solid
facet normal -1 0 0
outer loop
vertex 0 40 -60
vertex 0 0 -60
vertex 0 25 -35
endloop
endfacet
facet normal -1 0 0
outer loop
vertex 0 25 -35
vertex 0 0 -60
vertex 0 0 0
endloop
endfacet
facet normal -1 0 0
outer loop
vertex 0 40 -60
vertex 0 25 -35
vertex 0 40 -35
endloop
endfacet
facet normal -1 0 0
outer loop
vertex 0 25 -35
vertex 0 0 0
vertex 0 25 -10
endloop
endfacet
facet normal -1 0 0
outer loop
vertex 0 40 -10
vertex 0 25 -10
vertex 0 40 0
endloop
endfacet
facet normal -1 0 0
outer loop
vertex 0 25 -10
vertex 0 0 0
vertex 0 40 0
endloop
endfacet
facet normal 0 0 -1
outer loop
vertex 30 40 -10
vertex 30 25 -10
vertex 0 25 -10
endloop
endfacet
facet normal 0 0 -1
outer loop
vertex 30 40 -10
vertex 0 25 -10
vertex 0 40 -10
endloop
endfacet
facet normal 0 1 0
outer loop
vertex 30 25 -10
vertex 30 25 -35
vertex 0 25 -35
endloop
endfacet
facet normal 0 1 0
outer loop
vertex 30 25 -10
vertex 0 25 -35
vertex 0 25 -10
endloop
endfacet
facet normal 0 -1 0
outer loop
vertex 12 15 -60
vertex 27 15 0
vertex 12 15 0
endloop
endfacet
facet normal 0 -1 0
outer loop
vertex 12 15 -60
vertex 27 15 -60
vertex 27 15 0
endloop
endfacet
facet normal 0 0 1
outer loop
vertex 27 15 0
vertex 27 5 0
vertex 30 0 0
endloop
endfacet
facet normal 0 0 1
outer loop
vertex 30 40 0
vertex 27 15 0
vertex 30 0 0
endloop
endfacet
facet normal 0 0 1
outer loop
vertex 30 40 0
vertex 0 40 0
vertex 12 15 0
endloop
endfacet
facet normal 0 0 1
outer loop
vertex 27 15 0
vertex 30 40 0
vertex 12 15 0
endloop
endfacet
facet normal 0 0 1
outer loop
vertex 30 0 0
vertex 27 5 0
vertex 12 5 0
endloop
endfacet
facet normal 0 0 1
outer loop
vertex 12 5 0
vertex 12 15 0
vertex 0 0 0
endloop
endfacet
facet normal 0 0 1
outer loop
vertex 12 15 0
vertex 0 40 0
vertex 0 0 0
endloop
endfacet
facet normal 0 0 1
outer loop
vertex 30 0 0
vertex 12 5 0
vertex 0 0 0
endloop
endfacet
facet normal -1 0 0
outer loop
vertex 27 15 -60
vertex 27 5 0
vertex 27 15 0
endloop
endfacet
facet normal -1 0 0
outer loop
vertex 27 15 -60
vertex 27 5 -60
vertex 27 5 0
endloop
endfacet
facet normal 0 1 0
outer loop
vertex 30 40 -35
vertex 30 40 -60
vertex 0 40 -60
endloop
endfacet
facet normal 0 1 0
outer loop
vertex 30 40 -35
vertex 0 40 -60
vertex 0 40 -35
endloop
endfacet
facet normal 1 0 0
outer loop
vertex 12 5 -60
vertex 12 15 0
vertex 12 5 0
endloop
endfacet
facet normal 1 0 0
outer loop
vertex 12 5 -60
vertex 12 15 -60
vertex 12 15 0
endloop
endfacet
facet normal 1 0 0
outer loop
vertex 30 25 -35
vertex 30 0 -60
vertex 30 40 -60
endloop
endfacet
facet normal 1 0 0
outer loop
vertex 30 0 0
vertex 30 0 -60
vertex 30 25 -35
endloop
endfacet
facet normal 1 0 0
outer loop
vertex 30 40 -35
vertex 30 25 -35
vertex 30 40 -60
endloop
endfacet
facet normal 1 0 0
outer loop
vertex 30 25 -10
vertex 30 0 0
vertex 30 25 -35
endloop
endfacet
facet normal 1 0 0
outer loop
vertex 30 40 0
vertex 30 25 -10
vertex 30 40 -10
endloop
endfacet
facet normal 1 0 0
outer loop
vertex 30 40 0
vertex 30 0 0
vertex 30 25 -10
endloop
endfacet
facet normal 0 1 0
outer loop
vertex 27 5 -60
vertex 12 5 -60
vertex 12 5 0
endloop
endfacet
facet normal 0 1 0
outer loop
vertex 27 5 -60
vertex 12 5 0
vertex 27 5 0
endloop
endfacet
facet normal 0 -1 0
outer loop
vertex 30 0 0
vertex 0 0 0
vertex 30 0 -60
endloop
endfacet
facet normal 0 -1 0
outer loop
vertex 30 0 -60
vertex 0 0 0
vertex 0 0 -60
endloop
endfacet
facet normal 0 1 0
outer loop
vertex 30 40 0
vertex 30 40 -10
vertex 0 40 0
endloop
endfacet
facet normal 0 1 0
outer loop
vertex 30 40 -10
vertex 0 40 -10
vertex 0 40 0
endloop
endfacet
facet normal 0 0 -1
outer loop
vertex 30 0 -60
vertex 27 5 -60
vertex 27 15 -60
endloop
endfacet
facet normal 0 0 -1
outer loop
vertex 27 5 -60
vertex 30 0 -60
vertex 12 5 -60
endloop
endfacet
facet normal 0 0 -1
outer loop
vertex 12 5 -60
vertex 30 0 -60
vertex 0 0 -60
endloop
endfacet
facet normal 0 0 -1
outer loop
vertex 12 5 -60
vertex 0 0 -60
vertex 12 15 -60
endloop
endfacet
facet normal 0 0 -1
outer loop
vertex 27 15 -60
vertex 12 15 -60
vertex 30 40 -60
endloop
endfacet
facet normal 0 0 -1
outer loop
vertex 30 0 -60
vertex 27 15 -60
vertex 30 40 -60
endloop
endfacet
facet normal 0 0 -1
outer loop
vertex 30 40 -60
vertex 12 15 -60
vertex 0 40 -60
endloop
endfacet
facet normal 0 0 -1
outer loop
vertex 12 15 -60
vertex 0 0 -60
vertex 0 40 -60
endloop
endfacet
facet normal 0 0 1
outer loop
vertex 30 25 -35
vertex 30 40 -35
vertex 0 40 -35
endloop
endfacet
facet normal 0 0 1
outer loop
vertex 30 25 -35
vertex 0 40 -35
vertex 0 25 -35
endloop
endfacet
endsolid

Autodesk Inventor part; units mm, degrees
ref_plane "YZ Plane" through (0, 0, 0) normal (1, 0, 0) x (0, 1, 0)
ref_plane "XZ Plane" through (0, 0, 0) normal (0, 1, 0) x (-1, 0, 0)
ref_plane "XY Plane" through (0, 0, 0) normal (0, 0, 1) x (1, 0, 0)
sketch "Sketch1" plane through (0, 0, 0) normal (1, 0, 0) x (0, 1, 0)
  line L0 (0, 0) -> (0, -60)
  line L1 (0, -60) -> (40, -60)
  line L2 (40, -60) -> (40, -35)
  line L3 (40, -35) -> (25, -35)
  line L4 (25, -35) -> (25, -10)
  line L5 (25, -10) -> (40, -10)
  line L6 (40, -10) -> (40, 0)
  line L7 (40, 0) -> (0, 0)
  dimension "d0" = 60
  dimension "d1" = 40
  dimension "d2" = 25
  dimension "d3" = 15
  dimension "d4" = 25
extrude "Extrusion1" add sketch "Sketch1" along normal blind 30
sketch "Sketch2" plane through (0, 0, -60) normal (0, 0, -1) x (-1, 0, 0)
  line L0 (-30, 40) -> (-30, 0) projected
  line L1 (-30, 0) -> (-30, 5)
  line L2 (-27, 5) -> (-27, 15)
  line L3 (-27, 15) -> (-12, 15)
  line L4 (-12, 15) -> (-12, 5)
  line L5 (-12, 5) -> (-27, 5)
  point P0 (0, 0)
  dimension "d7" = 5
  dimension "d8" = 3
  dimension "d9" = 10
  dimension "d10" = 15
extrude "Extrusion2" cut sketch "Sketch2" against normal blind 60
properties part number "Model Creation 2"
